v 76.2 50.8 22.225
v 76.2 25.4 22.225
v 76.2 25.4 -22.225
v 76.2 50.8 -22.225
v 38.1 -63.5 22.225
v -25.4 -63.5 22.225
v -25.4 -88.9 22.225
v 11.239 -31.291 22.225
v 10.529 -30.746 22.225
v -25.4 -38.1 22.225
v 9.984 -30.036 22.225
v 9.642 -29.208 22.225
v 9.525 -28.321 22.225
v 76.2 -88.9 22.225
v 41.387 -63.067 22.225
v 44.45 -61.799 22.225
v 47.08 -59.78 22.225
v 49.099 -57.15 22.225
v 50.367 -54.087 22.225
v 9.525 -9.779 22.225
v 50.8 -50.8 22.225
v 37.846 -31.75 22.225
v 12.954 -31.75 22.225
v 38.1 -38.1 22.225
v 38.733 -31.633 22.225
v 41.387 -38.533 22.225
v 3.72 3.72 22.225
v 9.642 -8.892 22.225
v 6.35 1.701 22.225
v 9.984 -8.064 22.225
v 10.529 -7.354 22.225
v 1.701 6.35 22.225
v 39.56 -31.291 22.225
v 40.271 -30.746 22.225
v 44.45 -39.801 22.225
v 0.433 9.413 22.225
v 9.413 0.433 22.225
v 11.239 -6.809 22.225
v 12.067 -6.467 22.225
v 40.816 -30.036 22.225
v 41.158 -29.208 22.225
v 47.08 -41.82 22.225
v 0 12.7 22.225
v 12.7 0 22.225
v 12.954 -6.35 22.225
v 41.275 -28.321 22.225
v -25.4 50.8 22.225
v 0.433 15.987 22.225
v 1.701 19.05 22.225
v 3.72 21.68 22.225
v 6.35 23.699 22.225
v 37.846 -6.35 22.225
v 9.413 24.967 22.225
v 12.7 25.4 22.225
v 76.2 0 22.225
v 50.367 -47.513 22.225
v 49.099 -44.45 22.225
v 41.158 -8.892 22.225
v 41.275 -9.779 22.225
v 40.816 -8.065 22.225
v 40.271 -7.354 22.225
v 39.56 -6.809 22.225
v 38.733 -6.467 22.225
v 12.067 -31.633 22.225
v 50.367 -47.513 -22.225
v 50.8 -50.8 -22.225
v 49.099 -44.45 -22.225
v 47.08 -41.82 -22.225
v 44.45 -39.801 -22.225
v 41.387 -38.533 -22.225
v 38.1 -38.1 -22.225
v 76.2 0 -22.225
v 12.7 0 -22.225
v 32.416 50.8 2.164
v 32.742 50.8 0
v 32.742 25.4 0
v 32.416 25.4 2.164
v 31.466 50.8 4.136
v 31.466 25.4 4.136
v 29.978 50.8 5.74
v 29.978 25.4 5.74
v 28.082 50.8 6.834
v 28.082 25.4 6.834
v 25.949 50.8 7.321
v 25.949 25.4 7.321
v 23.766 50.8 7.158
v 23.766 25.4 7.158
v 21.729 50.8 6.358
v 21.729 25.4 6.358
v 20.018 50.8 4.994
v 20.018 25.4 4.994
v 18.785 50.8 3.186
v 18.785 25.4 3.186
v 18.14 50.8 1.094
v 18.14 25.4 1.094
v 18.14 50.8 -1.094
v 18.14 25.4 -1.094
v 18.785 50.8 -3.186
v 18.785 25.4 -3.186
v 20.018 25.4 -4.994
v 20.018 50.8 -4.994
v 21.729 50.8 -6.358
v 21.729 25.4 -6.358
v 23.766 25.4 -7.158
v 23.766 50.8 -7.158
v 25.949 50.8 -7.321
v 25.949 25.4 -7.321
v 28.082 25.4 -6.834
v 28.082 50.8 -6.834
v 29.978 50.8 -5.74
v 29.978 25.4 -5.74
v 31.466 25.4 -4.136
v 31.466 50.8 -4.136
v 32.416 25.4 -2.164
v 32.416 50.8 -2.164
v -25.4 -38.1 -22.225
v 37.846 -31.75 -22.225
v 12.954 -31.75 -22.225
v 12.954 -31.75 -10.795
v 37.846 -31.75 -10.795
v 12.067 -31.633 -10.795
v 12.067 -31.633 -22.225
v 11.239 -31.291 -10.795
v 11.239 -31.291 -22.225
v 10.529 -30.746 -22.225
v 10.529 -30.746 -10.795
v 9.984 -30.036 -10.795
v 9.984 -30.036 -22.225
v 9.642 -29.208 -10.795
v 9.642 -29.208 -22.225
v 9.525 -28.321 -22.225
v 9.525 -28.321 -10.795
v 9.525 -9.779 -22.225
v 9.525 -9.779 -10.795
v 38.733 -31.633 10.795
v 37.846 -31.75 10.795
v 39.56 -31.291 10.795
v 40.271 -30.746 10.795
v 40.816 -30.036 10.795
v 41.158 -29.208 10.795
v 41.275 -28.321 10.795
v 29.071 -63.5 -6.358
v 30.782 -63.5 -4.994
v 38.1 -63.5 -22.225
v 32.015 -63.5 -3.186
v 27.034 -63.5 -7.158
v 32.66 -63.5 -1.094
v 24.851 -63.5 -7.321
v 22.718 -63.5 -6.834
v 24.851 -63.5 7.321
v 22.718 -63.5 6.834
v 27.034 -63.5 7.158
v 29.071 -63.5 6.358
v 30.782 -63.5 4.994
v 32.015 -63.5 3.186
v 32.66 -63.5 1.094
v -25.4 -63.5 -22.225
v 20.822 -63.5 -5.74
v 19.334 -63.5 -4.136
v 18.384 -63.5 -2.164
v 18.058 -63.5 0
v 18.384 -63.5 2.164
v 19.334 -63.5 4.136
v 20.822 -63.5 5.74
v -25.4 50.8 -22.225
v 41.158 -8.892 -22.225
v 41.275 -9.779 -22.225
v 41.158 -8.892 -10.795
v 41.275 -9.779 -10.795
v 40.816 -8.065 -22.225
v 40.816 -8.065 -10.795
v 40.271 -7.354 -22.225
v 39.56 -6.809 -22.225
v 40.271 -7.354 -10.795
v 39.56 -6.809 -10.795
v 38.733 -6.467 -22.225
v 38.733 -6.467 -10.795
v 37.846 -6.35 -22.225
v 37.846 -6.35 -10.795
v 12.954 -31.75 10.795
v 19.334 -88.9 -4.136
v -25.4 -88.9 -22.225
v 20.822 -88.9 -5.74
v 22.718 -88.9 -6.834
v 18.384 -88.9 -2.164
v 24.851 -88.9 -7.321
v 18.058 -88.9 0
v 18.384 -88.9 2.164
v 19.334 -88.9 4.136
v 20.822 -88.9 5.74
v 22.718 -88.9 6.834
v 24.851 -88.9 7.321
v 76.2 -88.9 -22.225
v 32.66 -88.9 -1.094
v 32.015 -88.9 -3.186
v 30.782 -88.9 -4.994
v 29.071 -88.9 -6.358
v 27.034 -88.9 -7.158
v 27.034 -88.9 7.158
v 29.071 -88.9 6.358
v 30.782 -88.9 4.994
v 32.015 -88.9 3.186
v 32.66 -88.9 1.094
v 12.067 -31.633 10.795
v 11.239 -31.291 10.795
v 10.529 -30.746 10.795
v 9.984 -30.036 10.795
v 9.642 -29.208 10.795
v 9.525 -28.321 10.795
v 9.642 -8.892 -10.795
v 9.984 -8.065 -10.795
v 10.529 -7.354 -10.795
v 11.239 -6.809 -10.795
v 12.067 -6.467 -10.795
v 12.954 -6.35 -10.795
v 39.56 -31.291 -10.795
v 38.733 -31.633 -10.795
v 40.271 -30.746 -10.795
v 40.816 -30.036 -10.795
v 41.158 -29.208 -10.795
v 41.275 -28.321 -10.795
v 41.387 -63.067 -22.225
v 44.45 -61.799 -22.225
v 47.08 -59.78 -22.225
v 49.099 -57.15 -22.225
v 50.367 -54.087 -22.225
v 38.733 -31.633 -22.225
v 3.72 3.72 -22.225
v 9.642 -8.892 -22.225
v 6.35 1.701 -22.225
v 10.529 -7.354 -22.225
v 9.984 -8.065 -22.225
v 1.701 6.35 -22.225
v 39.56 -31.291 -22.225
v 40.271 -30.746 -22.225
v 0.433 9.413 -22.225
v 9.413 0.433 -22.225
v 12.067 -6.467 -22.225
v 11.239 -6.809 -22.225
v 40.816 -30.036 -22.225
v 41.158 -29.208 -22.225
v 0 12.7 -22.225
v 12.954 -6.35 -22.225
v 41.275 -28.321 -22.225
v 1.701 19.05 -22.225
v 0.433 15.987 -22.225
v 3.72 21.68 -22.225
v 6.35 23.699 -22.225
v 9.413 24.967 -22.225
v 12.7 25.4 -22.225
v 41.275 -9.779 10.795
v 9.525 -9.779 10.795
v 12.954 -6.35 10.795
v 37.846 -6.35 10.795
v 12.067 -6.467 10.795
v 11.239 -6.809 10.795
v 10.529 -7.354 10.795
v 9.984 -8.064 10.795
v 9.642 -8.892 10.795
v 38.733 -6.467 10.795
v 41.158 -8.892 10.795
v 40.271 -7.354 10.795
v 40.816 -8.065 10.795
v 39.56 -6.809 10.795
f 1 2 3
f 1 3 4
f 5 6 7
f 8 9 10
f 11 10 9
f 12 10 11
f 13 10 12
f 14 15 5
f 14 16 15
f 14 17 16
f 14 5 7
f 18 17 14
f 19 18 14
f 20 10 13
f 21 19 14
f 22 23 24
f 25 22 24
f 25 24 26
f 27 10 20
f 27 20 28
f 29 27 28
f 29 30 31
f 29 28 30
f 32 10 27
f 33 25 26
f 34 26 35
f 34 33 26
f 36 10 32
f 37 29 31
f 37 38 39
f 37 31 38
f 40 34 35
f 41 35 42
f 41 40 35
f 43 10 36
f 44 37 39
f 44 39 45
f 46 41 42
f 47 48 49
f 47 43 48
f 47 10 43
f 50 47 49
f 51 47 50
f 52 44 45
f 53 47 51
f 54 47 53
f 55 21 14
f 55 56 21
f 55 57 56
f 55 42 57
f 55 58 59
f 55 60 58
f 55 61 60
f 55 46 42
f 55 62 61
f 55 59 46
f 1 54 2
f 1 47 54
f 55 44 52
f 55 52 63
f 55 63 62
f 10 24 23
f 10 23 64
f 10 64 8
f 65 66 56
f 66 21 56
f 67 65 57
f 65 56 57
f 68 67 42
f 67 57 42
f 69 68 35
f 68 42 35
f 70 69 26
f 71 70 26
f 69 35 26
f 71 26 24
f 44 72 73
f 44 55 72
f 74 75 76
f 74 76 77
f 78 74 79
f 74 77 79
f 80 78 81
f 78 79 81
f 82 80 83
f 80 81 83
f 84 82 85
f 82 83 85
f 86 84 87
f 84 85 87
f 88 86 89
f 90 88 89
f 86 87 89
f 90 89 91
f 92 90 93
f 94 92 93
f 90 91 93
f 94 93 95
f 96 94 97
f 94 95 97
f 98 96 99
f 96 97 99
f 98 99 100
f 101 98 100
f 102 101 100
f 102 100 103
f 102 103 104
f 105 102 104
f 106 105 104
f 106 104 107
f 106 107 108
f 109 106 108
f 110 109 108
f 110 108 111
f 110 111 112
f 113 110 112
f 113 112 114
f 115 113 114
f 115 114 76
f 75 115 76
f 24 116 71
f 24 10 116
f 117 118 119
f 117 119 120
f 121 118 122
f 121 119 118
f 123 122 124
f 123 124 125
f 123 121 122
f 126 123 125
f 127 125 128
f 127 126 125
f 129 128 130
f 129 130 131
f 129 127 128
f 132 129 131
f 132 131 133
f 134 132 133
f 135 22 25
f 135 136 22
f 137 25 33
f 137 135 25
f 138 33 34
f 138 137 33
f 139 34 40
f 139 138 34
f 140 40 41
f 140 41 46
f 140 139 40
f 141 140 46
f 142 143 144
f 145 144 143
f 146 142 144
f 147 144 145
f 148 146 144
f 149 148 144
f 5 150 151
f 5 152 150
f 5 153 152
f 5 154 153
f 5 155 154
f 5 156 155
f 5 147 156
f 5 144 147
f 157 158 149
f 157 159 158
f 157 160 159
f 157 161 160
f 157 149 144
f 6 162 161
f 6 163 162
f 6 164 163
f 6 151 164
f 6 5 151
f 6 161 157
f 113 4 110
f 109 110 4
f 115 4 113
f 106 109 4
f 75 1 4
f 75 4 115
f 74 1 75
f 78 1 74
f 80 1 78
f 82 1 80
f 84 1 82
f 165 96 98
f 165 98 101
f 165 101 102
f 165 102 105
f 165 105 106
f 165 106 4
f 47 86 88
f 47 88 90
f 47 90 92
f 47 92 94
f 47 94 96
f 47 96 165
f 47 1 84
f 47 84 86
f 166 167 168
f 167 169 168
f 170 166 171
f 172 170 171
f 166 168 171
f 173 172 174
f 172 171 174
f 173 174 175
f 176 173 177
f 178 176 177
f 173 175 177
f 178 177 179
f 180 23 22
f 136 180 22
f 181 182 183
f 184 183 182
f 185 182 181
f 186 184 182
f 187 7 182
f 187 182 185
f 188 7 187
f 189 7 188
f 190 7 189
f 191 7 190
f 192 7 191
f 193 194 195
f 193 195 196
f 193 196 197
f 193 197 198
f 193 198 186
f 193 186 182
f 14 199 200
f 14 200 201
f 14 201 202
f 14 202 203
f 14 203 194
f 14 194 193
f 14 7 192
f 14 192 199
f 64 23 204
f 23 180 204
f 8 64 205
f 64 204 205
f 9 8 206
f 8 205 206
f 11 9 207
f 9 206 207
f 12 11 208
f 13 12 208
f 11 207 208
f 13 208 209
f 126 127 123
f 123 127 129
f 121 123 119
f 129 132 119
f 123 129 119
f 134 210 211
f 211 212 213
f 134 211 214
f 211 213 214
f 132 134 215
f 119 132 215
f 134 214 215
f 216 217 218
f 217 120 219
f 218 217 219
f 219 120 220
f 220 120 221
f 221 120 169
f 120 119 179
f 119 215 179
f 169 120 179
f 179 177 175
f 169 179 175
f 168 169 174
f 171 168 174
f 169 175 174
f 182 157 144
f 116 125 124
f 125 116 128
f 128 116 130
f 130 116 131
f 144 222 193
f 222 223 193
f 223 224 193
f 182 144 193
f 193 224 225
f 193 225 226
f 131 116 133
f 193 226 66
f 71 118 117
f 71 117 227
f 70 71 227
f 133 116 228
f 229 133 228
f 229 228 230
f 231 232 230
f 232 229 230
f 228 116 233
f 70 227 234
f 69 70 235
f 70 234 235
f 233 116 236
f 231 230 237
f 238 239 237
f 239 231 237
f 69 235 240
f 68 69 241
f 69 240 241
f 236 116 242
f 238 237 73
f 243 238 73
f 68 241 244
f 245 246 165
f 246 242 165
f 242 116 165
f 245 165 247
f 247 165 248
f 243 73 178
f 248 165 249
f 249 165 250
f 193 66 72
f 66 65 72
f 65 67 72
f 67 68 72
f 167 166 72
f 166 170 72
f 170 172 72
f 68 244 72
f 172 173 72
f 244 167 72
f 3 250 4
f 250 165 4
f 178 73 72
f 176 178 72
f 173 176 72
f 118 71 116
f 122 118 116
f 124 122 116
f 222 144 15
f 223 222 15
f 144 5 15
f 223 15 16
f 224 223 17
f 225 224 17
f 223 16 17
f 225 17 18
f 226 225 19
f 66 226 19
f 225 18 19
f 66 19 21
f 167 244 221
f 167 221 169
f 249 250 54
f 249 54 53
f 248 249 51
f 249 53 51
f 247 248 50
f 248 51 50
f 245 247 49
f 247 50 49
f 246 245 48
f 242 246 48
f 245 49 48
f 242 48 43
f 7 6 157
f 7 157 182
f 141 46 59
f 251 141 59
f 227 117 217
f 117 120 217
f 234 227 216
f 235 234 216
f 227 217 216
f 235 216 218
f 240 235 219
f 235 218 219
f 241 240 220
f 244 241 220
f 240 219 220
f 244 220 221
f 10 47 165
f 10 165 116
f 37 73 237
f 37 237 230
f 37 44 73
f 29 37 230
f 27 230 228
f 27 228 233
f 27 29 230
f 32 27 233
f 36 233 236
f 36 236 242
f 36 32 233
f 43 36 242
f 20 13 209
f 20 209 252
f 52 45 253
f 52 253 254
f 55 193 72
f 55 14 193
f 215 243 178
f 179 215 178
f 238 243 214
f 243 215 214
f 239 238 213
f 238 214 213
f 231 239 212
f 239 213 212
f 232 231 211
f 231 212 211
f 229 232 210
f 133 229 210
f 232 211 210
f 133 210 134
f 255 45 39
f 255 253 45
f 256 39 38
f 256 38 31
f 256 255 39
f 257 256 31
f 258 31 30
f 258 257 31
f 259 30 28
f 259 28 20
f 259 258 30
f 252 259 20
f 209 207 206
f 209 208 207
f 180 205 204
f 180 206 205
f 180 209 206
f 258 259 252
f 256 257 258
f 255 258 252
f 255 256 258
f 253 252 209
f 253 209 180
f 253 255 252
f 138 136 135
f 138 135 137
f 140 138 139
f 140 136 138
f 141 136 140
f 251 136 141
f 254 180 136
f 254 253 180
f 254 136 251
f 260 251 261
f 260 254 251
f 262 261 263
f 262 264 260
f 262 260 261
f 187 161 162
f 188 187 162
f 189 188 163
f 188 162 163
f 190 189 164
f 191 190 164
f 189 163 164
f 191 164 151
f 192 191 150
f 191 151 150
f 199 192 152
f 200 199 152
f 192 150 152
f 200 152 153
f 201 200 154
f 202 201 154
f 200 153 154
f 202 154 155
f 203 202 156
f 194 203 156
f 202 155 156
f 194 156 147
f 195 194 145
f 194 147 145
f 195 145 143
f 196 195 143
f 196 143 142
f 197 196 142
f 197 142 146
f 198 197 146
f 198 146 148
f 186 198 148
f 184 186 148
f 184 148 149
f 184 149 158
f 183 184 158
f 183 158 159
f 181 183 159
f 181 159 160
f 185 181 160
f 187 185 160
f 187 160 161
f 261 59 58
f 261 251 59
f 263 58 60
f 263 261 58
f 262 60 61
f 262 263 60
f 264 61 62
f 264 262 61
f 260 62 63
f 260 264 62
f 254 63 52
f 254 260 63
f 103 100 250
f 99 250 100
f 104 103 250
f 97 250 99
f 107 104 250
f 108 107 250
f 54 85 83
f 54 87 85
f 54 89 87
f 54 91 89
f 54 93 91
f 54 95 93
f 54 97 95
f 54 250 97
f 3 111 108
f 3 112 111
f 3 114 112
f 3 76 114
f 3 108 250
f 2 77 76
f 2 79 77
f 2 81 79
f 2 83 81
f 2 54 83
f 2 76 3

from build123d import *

# Parameters (mm, degrees)
BOSS_EXTRUDE1_DEPTH         = 22.225
FILLET1_R                   = 12.7
F_5_8_18_TAPPED_HOLE1_D     = 14.68374
F_5_8_18_TAPPED_HOLE1_DEPTH = 25.4
F_5_8_18_TAPPED_HOLE2_D     = 14.68374
F_5_8_18_TAPPED_HOLE2_DEPTH = 25.4
SKETCH8_W                   = 31.75
SKETCH8_H                   = 25.4
CUT_EXTRUDE1_DEPTH          = 11.43
FILLET2_R                   = 3.429
FILLET2_OF_MIRROR1_R        = 3.429


with BuildPart() as part:
    # Sketch1 → Boss-Extrude1 (new, symmetric)
    with BuildSketch(Plane.XY):
        Polygon((76.2, 0), (0, 0), (0, 25.4), (76.2, 25.4), (76.2, 50.8), (-25.4, 50.8), (-25.4, -38.1), (50.8, -38.1), (50.8, -63.5), (-25.4, -63.5), (-25.4, -88.9), (76.2, -88.9), align=None)
    extrude(amount=BOSS_EXTRUDE1_DEPTH, both=True)

    # Fillet1
    fillet1_edges = [part.edges().sort_by_distance(p)[0] for p in [
        (50.8, -63.5, 0),
        (50.8, -38.1, 0),
        (0, 25.4, 0),
        (0, 0, 0),
    ]]
    fillet(fillet1_edges, radius=FILLET1_R - 0.0001)  # a hair under: the kernel refuses the full size

    # 5/8-18 Tapped Hole1
    with Locations(Plane.XZ.offset(88.9)):
        with Locations((25.4, 0)):
            Hole(F_5_8_18_TAPPED_HOLE1_D / 2, depth=F_5_8_18_TAPPED_HOLE1_DEPTH)

    # 5/8-18 Tapped Hole2
    with Locations(Plane(origin=(0, 50.8, 0), x_dir=(-1, 0, 0), z_dir=(0, 1, 0))):
        with Locations((-25.4, 0)):
            Hole(F_5_8_18_TAPPED_HOLE2_D / 2, depth=F_5_8_18_TAPPED_HOLE2_DEPTH)

    # Sketch8 → Cut-Extrude1 (cut)
    with BuildSketch(Plane.XY.offset(22.225)):
        with Locations((25.4, -19.05)):
            Rectangle(SKETCH8_W, SKETCH8_H)
    cut_extrude1 = extrude(amount=-CUT_EXTRUDE1_DEPTH, mode=Mode.SUBTRACT)

    # Fillet2
    fillet2_edges = [part.edges().sort_by_distance(p)[0] for p in [
        (41.275, -6.35, 16.51),
        (41.275, -31.75, 16.51),
        (9.525, -31.75, 16.51),
        (9.525, -6.35, 16.51),
    ]]
    fillet(fillet2_edges, radius=FILLET2_R)

    # Mirror1: Cut-Extrude1 across plane
    add(cut_extrude1.mirror(Plane.XY), mode=Mode.SUBTRACT)

    # Fillet2 of Mirror1
    fillet2_of_mirror1_edges = [part.edges().sort_by_distance(p)[0] for p in [
        (41.275, -6.35, -16.51),
        (41.275, -31.75, -16.51),
        (9.525, -31.75, -16.51),
        (9.525, -6.35, -16.51),
    ]]
    fillet(fillet2_of_mirror1_edges, radius=FILLET2_OF_MIRROR1_R)


solid = part.part
